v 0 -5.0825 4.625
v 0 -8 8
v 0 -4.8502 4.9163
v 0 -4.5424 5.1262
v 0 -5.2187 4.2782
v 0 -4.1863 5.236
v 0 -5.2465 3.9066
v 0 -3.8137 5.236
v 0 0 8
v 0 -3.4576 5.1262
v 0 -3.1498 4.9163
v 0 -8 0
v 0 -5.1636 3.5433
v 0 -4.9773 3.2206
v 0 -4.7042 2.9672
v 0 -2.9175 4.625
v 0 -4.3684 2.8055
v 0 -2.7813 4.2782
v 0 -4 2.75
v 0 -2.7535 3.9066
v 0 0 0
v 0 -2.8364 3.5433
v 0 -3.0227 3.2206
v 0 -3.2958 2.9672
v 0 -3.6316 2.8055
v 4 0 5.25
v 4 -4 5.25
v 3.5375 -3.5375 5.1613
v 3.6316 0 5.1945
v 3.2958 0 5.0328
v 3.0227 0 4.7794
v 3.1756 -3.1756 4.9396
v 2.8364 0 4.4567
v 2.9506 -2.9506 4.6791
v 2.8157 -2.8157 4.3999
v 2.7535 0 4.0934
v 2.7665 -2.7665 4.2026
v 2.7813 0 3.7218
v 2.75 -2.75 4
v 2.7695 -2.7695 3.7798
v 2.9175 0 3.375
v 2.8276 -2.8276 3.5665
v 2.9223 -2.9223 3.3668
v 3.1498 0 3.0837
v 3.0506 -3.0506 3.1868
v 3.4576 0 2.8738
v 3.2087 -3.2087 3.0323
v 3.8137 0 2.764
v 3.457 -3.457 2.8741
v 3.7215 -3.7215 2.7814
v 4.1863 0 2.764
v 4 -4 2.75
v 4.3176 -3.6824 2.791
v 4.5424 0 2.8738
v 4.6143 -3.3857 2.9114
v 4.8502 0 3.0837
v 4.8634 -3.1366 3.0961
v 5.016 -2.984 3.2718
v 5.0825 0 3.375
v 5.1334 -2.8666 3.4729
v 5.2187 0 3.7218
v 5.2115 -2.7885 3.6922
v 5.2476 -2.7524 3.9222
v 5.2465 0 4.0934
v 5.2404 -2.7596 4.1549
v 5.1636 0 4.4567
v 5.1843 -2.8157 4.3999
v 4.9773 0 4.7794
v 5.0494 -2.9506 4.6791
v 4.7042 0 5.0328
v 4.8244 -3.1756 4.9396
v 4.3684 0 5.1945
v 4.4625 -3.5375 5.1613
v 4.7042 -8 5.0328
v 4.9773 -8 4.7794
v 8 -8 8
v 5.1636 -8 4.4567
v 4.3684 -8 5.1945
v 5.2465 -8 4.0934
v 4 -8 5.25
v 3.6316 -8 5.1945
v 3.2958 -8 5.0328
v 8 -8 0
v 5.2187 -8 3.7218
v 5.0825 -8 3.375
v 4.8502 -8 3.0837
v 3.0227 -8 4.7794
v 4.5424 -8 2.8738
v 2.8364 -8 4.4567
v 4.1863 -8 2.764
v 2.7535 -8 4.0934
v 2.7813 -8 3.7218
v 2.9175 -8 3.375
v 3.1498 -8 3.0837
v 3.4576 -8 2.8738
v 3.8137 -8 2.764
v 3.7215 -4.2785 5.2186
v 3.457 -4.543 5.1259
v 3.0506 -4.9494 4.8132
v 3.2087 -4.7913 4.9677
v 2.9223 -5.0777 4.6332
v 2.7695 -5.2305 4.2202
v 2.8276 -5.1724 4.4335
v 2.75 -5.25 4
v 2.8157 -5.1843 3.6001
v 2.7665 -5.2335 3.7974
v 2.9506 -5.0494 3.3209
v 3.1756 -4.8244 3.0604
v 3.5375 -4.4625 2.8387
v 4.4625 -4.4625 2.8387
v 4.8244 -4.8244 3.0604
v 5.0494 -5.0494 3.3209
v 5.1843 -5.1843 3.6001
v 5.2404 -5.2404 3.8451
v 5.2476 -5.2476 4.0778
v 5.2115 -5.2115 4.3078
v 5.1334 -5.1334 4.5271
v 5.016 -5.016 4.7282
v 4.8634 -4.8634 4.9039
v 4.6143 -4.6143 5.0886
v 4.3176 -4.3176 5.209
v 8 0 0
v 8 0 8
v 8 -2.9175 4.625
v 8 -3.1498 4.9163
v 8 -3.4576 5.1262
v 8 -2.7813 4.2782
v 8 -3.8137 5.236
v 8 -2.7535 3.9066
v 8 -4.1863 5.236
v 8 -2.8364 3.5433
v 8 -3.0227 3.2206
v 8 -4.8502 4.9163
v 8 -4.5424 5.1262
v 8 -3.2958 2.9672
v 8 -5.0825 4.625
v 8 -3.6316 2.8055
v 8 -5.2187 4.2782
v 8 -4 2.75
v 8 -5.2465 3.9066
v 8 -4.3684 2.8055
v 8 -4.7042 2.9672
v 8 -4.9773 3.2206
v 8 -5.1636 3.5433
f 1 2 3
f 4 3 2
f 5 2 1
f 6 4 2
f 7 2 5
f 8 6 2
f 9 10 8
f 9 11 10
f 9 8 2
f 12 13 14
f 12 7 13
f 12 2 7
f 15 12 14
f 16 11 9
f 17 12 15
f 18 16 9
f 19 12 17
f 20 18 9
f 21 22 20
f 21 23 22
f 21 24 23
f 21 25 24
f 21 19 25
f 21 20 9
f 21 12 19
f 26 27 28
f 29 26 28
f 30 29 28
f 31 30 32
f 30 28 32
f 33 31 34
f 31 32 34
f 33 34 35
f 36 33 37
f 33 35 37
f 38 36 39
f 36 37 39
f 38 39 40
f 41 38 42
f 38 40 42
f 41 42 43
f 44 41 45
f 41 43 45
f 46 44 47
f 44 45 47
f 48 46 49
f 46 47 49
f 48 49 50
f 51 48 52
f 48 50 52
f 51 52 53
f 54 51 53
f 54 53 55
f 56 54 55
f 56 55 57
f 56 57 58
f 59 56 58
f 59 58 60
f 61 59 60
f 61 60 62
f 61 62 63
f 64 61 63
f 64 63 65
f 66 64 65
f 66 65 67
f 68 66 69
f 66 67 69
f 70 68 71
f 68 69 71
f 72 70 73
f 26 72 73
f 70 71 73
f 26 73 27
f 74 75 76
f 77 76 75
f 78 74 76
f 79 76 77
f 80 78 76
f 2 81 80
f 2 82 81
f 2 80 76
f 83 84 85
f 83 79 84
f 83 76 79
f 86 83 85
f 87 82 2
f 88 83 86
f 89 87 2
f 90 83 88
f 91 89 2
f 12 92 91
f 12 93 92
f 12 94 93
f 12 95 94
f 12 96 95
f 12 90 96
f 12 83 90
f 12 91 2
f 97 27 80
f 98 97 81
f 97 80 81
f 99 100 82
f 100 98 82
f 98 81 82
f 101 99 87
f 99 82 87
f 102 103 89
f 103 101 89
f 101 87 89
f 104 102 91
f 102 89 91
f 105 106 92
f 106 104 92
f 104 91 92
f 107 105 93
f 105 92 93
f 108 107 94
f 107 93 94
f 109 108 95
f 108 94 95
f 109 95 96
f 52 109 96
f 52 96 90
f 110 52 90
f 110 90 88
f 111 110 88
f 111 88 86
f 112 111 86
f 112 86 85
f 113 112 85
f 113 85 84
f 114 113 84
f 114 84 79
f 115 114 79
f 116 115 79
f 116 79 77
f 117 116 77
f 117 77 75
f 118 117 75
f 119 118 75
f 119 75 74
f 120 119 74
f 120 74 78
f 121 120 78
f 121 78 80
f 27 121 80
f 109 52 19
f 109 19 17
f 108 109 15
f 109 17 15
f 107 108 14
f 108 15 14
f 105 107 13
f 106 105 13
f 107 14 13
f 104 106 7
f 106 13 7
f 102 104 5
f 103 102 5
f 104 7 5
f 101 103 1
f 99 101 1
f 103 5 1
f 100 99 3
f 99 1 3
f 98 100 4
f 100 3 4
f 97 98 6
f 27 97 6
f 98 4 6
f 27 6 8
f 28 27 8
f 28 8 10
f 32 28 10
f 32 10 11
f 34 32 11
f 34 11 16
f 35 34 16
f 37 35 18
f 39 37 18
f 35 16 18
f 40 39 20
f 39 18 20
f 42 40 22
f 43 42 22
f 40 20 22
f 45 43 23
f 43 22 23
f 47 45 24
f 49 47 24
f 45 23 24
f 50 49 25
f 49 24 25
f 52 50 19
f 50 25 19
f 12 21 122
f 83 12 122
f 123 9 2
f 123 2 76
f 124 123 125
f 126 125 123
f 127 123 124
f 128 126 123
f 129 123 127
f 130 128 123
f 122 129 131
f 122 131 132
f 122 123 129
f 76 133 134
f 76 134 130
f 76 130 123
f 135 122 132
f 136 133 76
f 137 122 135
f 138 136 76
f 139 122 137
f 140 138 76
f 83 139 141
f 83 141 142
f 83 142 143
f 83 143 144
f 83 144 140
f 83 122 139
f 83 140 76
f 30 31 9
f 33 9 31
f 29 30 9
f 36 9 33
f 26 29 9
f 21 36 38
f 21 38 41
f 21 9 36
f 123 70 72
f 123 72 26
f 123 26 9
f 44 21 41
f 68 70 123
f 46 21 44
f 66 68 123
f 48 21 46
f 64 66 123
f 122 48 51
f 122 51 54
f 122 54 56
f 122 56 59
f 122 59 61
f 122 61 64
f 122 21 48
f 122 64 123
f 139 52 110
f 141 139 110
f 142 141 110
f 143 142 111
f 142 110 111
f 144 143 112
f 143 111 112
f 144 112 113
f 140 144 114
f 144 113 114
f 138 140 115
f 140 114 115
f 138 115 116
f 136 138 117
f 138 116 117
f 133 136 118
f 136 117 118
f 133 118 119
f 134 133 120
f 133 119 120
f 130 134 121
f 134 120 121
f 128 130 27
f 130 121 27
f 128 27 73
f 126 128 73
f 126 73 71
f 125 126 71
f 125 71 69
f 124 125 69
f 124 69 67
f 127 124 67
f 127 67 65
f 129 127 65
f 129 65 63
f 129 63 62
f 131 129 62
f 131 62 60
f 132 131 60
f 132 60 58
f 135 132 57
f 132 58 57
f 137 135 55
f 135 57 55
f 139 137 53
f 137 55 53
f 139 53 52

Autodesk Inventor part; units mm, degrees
ref_plane "YZ Plane" through (0, 0, 0) normal (1, 0, 0) x (0, 1, 0)
ref_plane "XZ Plane" through (0, 0, 0) normal (0, 1, 0) x (-1, 0, 0)
ref_plane "XY Plane" through (0, 0, 0) normal (0, 0, 1) x (1, 0, 0)
sketch "スケッチ1" plane through (0, 0, 0) normal (0, 0, 1) x (1, 0, 0)
  line L0 (0, 0) -> (8, 0)
  line L1 (8, 0) -> (8, -8)
  line L2 (8, -8) -> (0, -8)
  line L3 (0, -8) -> (0, 0)
  line L4 (0, -4) -> (8, -4)
  line L5 (4, 0) -> (4, -8)
  dimension "d0" = 8
  dimension "d1" = 8
extrude "押し出し1" add sketch "スケッチ1" along normal blind 8
sketch "スケッチ2" plane through (8, -8, 0) normal (1, 0, 0) x (0, 0, -1)
  line L0 (-8, 8) -> (0, 8) projected
  line L1 (0, 8) -> (0, 0) projected
  line L2 (0, 0) -> (-8, 0) projected
  line L3 (-8, 0) -> (-8, 8) projected
  line L4 (-8, 8) -> (0, 0)
  line L5 (0, 8) -> (0, 0) projected
  line L6 (-8, 0) -> (0, 8)
  point P0 (-4, 4)
hole "穴1" at (8, -4, 4) direction (-1, 0, 0) diameter 2.5 end through all
sketch "スケッチ3" plane through (0, 0, 0) normal (0, 1, 0) x (1, 0, 0)
  line L0 (8, 0) -> (8, -8) projected
  line L1 (8, -8) -> (0, -8) projected
  line L2 (0, -8) -> (0, 0) projected
  line L3 (0, 0) -> (8, 0) projected
  line L4 (0, -8) -> (8, 0)
  line L5 (8, 0) -> (8, -8) projected
  line L6 (0, 0) -> (8, 0) projected
  line L7 (8, -8) -> (0, 0)
  point P0 (4, -4)
hole "穴2" at (4, 0, 4) direction (0, -1, 0) diameter 2.5 end through all
equation "\"d0\" = d1"
properties part number "垂直ブロック 真鍮 8" material "真鍮、ソフト イエロー"
